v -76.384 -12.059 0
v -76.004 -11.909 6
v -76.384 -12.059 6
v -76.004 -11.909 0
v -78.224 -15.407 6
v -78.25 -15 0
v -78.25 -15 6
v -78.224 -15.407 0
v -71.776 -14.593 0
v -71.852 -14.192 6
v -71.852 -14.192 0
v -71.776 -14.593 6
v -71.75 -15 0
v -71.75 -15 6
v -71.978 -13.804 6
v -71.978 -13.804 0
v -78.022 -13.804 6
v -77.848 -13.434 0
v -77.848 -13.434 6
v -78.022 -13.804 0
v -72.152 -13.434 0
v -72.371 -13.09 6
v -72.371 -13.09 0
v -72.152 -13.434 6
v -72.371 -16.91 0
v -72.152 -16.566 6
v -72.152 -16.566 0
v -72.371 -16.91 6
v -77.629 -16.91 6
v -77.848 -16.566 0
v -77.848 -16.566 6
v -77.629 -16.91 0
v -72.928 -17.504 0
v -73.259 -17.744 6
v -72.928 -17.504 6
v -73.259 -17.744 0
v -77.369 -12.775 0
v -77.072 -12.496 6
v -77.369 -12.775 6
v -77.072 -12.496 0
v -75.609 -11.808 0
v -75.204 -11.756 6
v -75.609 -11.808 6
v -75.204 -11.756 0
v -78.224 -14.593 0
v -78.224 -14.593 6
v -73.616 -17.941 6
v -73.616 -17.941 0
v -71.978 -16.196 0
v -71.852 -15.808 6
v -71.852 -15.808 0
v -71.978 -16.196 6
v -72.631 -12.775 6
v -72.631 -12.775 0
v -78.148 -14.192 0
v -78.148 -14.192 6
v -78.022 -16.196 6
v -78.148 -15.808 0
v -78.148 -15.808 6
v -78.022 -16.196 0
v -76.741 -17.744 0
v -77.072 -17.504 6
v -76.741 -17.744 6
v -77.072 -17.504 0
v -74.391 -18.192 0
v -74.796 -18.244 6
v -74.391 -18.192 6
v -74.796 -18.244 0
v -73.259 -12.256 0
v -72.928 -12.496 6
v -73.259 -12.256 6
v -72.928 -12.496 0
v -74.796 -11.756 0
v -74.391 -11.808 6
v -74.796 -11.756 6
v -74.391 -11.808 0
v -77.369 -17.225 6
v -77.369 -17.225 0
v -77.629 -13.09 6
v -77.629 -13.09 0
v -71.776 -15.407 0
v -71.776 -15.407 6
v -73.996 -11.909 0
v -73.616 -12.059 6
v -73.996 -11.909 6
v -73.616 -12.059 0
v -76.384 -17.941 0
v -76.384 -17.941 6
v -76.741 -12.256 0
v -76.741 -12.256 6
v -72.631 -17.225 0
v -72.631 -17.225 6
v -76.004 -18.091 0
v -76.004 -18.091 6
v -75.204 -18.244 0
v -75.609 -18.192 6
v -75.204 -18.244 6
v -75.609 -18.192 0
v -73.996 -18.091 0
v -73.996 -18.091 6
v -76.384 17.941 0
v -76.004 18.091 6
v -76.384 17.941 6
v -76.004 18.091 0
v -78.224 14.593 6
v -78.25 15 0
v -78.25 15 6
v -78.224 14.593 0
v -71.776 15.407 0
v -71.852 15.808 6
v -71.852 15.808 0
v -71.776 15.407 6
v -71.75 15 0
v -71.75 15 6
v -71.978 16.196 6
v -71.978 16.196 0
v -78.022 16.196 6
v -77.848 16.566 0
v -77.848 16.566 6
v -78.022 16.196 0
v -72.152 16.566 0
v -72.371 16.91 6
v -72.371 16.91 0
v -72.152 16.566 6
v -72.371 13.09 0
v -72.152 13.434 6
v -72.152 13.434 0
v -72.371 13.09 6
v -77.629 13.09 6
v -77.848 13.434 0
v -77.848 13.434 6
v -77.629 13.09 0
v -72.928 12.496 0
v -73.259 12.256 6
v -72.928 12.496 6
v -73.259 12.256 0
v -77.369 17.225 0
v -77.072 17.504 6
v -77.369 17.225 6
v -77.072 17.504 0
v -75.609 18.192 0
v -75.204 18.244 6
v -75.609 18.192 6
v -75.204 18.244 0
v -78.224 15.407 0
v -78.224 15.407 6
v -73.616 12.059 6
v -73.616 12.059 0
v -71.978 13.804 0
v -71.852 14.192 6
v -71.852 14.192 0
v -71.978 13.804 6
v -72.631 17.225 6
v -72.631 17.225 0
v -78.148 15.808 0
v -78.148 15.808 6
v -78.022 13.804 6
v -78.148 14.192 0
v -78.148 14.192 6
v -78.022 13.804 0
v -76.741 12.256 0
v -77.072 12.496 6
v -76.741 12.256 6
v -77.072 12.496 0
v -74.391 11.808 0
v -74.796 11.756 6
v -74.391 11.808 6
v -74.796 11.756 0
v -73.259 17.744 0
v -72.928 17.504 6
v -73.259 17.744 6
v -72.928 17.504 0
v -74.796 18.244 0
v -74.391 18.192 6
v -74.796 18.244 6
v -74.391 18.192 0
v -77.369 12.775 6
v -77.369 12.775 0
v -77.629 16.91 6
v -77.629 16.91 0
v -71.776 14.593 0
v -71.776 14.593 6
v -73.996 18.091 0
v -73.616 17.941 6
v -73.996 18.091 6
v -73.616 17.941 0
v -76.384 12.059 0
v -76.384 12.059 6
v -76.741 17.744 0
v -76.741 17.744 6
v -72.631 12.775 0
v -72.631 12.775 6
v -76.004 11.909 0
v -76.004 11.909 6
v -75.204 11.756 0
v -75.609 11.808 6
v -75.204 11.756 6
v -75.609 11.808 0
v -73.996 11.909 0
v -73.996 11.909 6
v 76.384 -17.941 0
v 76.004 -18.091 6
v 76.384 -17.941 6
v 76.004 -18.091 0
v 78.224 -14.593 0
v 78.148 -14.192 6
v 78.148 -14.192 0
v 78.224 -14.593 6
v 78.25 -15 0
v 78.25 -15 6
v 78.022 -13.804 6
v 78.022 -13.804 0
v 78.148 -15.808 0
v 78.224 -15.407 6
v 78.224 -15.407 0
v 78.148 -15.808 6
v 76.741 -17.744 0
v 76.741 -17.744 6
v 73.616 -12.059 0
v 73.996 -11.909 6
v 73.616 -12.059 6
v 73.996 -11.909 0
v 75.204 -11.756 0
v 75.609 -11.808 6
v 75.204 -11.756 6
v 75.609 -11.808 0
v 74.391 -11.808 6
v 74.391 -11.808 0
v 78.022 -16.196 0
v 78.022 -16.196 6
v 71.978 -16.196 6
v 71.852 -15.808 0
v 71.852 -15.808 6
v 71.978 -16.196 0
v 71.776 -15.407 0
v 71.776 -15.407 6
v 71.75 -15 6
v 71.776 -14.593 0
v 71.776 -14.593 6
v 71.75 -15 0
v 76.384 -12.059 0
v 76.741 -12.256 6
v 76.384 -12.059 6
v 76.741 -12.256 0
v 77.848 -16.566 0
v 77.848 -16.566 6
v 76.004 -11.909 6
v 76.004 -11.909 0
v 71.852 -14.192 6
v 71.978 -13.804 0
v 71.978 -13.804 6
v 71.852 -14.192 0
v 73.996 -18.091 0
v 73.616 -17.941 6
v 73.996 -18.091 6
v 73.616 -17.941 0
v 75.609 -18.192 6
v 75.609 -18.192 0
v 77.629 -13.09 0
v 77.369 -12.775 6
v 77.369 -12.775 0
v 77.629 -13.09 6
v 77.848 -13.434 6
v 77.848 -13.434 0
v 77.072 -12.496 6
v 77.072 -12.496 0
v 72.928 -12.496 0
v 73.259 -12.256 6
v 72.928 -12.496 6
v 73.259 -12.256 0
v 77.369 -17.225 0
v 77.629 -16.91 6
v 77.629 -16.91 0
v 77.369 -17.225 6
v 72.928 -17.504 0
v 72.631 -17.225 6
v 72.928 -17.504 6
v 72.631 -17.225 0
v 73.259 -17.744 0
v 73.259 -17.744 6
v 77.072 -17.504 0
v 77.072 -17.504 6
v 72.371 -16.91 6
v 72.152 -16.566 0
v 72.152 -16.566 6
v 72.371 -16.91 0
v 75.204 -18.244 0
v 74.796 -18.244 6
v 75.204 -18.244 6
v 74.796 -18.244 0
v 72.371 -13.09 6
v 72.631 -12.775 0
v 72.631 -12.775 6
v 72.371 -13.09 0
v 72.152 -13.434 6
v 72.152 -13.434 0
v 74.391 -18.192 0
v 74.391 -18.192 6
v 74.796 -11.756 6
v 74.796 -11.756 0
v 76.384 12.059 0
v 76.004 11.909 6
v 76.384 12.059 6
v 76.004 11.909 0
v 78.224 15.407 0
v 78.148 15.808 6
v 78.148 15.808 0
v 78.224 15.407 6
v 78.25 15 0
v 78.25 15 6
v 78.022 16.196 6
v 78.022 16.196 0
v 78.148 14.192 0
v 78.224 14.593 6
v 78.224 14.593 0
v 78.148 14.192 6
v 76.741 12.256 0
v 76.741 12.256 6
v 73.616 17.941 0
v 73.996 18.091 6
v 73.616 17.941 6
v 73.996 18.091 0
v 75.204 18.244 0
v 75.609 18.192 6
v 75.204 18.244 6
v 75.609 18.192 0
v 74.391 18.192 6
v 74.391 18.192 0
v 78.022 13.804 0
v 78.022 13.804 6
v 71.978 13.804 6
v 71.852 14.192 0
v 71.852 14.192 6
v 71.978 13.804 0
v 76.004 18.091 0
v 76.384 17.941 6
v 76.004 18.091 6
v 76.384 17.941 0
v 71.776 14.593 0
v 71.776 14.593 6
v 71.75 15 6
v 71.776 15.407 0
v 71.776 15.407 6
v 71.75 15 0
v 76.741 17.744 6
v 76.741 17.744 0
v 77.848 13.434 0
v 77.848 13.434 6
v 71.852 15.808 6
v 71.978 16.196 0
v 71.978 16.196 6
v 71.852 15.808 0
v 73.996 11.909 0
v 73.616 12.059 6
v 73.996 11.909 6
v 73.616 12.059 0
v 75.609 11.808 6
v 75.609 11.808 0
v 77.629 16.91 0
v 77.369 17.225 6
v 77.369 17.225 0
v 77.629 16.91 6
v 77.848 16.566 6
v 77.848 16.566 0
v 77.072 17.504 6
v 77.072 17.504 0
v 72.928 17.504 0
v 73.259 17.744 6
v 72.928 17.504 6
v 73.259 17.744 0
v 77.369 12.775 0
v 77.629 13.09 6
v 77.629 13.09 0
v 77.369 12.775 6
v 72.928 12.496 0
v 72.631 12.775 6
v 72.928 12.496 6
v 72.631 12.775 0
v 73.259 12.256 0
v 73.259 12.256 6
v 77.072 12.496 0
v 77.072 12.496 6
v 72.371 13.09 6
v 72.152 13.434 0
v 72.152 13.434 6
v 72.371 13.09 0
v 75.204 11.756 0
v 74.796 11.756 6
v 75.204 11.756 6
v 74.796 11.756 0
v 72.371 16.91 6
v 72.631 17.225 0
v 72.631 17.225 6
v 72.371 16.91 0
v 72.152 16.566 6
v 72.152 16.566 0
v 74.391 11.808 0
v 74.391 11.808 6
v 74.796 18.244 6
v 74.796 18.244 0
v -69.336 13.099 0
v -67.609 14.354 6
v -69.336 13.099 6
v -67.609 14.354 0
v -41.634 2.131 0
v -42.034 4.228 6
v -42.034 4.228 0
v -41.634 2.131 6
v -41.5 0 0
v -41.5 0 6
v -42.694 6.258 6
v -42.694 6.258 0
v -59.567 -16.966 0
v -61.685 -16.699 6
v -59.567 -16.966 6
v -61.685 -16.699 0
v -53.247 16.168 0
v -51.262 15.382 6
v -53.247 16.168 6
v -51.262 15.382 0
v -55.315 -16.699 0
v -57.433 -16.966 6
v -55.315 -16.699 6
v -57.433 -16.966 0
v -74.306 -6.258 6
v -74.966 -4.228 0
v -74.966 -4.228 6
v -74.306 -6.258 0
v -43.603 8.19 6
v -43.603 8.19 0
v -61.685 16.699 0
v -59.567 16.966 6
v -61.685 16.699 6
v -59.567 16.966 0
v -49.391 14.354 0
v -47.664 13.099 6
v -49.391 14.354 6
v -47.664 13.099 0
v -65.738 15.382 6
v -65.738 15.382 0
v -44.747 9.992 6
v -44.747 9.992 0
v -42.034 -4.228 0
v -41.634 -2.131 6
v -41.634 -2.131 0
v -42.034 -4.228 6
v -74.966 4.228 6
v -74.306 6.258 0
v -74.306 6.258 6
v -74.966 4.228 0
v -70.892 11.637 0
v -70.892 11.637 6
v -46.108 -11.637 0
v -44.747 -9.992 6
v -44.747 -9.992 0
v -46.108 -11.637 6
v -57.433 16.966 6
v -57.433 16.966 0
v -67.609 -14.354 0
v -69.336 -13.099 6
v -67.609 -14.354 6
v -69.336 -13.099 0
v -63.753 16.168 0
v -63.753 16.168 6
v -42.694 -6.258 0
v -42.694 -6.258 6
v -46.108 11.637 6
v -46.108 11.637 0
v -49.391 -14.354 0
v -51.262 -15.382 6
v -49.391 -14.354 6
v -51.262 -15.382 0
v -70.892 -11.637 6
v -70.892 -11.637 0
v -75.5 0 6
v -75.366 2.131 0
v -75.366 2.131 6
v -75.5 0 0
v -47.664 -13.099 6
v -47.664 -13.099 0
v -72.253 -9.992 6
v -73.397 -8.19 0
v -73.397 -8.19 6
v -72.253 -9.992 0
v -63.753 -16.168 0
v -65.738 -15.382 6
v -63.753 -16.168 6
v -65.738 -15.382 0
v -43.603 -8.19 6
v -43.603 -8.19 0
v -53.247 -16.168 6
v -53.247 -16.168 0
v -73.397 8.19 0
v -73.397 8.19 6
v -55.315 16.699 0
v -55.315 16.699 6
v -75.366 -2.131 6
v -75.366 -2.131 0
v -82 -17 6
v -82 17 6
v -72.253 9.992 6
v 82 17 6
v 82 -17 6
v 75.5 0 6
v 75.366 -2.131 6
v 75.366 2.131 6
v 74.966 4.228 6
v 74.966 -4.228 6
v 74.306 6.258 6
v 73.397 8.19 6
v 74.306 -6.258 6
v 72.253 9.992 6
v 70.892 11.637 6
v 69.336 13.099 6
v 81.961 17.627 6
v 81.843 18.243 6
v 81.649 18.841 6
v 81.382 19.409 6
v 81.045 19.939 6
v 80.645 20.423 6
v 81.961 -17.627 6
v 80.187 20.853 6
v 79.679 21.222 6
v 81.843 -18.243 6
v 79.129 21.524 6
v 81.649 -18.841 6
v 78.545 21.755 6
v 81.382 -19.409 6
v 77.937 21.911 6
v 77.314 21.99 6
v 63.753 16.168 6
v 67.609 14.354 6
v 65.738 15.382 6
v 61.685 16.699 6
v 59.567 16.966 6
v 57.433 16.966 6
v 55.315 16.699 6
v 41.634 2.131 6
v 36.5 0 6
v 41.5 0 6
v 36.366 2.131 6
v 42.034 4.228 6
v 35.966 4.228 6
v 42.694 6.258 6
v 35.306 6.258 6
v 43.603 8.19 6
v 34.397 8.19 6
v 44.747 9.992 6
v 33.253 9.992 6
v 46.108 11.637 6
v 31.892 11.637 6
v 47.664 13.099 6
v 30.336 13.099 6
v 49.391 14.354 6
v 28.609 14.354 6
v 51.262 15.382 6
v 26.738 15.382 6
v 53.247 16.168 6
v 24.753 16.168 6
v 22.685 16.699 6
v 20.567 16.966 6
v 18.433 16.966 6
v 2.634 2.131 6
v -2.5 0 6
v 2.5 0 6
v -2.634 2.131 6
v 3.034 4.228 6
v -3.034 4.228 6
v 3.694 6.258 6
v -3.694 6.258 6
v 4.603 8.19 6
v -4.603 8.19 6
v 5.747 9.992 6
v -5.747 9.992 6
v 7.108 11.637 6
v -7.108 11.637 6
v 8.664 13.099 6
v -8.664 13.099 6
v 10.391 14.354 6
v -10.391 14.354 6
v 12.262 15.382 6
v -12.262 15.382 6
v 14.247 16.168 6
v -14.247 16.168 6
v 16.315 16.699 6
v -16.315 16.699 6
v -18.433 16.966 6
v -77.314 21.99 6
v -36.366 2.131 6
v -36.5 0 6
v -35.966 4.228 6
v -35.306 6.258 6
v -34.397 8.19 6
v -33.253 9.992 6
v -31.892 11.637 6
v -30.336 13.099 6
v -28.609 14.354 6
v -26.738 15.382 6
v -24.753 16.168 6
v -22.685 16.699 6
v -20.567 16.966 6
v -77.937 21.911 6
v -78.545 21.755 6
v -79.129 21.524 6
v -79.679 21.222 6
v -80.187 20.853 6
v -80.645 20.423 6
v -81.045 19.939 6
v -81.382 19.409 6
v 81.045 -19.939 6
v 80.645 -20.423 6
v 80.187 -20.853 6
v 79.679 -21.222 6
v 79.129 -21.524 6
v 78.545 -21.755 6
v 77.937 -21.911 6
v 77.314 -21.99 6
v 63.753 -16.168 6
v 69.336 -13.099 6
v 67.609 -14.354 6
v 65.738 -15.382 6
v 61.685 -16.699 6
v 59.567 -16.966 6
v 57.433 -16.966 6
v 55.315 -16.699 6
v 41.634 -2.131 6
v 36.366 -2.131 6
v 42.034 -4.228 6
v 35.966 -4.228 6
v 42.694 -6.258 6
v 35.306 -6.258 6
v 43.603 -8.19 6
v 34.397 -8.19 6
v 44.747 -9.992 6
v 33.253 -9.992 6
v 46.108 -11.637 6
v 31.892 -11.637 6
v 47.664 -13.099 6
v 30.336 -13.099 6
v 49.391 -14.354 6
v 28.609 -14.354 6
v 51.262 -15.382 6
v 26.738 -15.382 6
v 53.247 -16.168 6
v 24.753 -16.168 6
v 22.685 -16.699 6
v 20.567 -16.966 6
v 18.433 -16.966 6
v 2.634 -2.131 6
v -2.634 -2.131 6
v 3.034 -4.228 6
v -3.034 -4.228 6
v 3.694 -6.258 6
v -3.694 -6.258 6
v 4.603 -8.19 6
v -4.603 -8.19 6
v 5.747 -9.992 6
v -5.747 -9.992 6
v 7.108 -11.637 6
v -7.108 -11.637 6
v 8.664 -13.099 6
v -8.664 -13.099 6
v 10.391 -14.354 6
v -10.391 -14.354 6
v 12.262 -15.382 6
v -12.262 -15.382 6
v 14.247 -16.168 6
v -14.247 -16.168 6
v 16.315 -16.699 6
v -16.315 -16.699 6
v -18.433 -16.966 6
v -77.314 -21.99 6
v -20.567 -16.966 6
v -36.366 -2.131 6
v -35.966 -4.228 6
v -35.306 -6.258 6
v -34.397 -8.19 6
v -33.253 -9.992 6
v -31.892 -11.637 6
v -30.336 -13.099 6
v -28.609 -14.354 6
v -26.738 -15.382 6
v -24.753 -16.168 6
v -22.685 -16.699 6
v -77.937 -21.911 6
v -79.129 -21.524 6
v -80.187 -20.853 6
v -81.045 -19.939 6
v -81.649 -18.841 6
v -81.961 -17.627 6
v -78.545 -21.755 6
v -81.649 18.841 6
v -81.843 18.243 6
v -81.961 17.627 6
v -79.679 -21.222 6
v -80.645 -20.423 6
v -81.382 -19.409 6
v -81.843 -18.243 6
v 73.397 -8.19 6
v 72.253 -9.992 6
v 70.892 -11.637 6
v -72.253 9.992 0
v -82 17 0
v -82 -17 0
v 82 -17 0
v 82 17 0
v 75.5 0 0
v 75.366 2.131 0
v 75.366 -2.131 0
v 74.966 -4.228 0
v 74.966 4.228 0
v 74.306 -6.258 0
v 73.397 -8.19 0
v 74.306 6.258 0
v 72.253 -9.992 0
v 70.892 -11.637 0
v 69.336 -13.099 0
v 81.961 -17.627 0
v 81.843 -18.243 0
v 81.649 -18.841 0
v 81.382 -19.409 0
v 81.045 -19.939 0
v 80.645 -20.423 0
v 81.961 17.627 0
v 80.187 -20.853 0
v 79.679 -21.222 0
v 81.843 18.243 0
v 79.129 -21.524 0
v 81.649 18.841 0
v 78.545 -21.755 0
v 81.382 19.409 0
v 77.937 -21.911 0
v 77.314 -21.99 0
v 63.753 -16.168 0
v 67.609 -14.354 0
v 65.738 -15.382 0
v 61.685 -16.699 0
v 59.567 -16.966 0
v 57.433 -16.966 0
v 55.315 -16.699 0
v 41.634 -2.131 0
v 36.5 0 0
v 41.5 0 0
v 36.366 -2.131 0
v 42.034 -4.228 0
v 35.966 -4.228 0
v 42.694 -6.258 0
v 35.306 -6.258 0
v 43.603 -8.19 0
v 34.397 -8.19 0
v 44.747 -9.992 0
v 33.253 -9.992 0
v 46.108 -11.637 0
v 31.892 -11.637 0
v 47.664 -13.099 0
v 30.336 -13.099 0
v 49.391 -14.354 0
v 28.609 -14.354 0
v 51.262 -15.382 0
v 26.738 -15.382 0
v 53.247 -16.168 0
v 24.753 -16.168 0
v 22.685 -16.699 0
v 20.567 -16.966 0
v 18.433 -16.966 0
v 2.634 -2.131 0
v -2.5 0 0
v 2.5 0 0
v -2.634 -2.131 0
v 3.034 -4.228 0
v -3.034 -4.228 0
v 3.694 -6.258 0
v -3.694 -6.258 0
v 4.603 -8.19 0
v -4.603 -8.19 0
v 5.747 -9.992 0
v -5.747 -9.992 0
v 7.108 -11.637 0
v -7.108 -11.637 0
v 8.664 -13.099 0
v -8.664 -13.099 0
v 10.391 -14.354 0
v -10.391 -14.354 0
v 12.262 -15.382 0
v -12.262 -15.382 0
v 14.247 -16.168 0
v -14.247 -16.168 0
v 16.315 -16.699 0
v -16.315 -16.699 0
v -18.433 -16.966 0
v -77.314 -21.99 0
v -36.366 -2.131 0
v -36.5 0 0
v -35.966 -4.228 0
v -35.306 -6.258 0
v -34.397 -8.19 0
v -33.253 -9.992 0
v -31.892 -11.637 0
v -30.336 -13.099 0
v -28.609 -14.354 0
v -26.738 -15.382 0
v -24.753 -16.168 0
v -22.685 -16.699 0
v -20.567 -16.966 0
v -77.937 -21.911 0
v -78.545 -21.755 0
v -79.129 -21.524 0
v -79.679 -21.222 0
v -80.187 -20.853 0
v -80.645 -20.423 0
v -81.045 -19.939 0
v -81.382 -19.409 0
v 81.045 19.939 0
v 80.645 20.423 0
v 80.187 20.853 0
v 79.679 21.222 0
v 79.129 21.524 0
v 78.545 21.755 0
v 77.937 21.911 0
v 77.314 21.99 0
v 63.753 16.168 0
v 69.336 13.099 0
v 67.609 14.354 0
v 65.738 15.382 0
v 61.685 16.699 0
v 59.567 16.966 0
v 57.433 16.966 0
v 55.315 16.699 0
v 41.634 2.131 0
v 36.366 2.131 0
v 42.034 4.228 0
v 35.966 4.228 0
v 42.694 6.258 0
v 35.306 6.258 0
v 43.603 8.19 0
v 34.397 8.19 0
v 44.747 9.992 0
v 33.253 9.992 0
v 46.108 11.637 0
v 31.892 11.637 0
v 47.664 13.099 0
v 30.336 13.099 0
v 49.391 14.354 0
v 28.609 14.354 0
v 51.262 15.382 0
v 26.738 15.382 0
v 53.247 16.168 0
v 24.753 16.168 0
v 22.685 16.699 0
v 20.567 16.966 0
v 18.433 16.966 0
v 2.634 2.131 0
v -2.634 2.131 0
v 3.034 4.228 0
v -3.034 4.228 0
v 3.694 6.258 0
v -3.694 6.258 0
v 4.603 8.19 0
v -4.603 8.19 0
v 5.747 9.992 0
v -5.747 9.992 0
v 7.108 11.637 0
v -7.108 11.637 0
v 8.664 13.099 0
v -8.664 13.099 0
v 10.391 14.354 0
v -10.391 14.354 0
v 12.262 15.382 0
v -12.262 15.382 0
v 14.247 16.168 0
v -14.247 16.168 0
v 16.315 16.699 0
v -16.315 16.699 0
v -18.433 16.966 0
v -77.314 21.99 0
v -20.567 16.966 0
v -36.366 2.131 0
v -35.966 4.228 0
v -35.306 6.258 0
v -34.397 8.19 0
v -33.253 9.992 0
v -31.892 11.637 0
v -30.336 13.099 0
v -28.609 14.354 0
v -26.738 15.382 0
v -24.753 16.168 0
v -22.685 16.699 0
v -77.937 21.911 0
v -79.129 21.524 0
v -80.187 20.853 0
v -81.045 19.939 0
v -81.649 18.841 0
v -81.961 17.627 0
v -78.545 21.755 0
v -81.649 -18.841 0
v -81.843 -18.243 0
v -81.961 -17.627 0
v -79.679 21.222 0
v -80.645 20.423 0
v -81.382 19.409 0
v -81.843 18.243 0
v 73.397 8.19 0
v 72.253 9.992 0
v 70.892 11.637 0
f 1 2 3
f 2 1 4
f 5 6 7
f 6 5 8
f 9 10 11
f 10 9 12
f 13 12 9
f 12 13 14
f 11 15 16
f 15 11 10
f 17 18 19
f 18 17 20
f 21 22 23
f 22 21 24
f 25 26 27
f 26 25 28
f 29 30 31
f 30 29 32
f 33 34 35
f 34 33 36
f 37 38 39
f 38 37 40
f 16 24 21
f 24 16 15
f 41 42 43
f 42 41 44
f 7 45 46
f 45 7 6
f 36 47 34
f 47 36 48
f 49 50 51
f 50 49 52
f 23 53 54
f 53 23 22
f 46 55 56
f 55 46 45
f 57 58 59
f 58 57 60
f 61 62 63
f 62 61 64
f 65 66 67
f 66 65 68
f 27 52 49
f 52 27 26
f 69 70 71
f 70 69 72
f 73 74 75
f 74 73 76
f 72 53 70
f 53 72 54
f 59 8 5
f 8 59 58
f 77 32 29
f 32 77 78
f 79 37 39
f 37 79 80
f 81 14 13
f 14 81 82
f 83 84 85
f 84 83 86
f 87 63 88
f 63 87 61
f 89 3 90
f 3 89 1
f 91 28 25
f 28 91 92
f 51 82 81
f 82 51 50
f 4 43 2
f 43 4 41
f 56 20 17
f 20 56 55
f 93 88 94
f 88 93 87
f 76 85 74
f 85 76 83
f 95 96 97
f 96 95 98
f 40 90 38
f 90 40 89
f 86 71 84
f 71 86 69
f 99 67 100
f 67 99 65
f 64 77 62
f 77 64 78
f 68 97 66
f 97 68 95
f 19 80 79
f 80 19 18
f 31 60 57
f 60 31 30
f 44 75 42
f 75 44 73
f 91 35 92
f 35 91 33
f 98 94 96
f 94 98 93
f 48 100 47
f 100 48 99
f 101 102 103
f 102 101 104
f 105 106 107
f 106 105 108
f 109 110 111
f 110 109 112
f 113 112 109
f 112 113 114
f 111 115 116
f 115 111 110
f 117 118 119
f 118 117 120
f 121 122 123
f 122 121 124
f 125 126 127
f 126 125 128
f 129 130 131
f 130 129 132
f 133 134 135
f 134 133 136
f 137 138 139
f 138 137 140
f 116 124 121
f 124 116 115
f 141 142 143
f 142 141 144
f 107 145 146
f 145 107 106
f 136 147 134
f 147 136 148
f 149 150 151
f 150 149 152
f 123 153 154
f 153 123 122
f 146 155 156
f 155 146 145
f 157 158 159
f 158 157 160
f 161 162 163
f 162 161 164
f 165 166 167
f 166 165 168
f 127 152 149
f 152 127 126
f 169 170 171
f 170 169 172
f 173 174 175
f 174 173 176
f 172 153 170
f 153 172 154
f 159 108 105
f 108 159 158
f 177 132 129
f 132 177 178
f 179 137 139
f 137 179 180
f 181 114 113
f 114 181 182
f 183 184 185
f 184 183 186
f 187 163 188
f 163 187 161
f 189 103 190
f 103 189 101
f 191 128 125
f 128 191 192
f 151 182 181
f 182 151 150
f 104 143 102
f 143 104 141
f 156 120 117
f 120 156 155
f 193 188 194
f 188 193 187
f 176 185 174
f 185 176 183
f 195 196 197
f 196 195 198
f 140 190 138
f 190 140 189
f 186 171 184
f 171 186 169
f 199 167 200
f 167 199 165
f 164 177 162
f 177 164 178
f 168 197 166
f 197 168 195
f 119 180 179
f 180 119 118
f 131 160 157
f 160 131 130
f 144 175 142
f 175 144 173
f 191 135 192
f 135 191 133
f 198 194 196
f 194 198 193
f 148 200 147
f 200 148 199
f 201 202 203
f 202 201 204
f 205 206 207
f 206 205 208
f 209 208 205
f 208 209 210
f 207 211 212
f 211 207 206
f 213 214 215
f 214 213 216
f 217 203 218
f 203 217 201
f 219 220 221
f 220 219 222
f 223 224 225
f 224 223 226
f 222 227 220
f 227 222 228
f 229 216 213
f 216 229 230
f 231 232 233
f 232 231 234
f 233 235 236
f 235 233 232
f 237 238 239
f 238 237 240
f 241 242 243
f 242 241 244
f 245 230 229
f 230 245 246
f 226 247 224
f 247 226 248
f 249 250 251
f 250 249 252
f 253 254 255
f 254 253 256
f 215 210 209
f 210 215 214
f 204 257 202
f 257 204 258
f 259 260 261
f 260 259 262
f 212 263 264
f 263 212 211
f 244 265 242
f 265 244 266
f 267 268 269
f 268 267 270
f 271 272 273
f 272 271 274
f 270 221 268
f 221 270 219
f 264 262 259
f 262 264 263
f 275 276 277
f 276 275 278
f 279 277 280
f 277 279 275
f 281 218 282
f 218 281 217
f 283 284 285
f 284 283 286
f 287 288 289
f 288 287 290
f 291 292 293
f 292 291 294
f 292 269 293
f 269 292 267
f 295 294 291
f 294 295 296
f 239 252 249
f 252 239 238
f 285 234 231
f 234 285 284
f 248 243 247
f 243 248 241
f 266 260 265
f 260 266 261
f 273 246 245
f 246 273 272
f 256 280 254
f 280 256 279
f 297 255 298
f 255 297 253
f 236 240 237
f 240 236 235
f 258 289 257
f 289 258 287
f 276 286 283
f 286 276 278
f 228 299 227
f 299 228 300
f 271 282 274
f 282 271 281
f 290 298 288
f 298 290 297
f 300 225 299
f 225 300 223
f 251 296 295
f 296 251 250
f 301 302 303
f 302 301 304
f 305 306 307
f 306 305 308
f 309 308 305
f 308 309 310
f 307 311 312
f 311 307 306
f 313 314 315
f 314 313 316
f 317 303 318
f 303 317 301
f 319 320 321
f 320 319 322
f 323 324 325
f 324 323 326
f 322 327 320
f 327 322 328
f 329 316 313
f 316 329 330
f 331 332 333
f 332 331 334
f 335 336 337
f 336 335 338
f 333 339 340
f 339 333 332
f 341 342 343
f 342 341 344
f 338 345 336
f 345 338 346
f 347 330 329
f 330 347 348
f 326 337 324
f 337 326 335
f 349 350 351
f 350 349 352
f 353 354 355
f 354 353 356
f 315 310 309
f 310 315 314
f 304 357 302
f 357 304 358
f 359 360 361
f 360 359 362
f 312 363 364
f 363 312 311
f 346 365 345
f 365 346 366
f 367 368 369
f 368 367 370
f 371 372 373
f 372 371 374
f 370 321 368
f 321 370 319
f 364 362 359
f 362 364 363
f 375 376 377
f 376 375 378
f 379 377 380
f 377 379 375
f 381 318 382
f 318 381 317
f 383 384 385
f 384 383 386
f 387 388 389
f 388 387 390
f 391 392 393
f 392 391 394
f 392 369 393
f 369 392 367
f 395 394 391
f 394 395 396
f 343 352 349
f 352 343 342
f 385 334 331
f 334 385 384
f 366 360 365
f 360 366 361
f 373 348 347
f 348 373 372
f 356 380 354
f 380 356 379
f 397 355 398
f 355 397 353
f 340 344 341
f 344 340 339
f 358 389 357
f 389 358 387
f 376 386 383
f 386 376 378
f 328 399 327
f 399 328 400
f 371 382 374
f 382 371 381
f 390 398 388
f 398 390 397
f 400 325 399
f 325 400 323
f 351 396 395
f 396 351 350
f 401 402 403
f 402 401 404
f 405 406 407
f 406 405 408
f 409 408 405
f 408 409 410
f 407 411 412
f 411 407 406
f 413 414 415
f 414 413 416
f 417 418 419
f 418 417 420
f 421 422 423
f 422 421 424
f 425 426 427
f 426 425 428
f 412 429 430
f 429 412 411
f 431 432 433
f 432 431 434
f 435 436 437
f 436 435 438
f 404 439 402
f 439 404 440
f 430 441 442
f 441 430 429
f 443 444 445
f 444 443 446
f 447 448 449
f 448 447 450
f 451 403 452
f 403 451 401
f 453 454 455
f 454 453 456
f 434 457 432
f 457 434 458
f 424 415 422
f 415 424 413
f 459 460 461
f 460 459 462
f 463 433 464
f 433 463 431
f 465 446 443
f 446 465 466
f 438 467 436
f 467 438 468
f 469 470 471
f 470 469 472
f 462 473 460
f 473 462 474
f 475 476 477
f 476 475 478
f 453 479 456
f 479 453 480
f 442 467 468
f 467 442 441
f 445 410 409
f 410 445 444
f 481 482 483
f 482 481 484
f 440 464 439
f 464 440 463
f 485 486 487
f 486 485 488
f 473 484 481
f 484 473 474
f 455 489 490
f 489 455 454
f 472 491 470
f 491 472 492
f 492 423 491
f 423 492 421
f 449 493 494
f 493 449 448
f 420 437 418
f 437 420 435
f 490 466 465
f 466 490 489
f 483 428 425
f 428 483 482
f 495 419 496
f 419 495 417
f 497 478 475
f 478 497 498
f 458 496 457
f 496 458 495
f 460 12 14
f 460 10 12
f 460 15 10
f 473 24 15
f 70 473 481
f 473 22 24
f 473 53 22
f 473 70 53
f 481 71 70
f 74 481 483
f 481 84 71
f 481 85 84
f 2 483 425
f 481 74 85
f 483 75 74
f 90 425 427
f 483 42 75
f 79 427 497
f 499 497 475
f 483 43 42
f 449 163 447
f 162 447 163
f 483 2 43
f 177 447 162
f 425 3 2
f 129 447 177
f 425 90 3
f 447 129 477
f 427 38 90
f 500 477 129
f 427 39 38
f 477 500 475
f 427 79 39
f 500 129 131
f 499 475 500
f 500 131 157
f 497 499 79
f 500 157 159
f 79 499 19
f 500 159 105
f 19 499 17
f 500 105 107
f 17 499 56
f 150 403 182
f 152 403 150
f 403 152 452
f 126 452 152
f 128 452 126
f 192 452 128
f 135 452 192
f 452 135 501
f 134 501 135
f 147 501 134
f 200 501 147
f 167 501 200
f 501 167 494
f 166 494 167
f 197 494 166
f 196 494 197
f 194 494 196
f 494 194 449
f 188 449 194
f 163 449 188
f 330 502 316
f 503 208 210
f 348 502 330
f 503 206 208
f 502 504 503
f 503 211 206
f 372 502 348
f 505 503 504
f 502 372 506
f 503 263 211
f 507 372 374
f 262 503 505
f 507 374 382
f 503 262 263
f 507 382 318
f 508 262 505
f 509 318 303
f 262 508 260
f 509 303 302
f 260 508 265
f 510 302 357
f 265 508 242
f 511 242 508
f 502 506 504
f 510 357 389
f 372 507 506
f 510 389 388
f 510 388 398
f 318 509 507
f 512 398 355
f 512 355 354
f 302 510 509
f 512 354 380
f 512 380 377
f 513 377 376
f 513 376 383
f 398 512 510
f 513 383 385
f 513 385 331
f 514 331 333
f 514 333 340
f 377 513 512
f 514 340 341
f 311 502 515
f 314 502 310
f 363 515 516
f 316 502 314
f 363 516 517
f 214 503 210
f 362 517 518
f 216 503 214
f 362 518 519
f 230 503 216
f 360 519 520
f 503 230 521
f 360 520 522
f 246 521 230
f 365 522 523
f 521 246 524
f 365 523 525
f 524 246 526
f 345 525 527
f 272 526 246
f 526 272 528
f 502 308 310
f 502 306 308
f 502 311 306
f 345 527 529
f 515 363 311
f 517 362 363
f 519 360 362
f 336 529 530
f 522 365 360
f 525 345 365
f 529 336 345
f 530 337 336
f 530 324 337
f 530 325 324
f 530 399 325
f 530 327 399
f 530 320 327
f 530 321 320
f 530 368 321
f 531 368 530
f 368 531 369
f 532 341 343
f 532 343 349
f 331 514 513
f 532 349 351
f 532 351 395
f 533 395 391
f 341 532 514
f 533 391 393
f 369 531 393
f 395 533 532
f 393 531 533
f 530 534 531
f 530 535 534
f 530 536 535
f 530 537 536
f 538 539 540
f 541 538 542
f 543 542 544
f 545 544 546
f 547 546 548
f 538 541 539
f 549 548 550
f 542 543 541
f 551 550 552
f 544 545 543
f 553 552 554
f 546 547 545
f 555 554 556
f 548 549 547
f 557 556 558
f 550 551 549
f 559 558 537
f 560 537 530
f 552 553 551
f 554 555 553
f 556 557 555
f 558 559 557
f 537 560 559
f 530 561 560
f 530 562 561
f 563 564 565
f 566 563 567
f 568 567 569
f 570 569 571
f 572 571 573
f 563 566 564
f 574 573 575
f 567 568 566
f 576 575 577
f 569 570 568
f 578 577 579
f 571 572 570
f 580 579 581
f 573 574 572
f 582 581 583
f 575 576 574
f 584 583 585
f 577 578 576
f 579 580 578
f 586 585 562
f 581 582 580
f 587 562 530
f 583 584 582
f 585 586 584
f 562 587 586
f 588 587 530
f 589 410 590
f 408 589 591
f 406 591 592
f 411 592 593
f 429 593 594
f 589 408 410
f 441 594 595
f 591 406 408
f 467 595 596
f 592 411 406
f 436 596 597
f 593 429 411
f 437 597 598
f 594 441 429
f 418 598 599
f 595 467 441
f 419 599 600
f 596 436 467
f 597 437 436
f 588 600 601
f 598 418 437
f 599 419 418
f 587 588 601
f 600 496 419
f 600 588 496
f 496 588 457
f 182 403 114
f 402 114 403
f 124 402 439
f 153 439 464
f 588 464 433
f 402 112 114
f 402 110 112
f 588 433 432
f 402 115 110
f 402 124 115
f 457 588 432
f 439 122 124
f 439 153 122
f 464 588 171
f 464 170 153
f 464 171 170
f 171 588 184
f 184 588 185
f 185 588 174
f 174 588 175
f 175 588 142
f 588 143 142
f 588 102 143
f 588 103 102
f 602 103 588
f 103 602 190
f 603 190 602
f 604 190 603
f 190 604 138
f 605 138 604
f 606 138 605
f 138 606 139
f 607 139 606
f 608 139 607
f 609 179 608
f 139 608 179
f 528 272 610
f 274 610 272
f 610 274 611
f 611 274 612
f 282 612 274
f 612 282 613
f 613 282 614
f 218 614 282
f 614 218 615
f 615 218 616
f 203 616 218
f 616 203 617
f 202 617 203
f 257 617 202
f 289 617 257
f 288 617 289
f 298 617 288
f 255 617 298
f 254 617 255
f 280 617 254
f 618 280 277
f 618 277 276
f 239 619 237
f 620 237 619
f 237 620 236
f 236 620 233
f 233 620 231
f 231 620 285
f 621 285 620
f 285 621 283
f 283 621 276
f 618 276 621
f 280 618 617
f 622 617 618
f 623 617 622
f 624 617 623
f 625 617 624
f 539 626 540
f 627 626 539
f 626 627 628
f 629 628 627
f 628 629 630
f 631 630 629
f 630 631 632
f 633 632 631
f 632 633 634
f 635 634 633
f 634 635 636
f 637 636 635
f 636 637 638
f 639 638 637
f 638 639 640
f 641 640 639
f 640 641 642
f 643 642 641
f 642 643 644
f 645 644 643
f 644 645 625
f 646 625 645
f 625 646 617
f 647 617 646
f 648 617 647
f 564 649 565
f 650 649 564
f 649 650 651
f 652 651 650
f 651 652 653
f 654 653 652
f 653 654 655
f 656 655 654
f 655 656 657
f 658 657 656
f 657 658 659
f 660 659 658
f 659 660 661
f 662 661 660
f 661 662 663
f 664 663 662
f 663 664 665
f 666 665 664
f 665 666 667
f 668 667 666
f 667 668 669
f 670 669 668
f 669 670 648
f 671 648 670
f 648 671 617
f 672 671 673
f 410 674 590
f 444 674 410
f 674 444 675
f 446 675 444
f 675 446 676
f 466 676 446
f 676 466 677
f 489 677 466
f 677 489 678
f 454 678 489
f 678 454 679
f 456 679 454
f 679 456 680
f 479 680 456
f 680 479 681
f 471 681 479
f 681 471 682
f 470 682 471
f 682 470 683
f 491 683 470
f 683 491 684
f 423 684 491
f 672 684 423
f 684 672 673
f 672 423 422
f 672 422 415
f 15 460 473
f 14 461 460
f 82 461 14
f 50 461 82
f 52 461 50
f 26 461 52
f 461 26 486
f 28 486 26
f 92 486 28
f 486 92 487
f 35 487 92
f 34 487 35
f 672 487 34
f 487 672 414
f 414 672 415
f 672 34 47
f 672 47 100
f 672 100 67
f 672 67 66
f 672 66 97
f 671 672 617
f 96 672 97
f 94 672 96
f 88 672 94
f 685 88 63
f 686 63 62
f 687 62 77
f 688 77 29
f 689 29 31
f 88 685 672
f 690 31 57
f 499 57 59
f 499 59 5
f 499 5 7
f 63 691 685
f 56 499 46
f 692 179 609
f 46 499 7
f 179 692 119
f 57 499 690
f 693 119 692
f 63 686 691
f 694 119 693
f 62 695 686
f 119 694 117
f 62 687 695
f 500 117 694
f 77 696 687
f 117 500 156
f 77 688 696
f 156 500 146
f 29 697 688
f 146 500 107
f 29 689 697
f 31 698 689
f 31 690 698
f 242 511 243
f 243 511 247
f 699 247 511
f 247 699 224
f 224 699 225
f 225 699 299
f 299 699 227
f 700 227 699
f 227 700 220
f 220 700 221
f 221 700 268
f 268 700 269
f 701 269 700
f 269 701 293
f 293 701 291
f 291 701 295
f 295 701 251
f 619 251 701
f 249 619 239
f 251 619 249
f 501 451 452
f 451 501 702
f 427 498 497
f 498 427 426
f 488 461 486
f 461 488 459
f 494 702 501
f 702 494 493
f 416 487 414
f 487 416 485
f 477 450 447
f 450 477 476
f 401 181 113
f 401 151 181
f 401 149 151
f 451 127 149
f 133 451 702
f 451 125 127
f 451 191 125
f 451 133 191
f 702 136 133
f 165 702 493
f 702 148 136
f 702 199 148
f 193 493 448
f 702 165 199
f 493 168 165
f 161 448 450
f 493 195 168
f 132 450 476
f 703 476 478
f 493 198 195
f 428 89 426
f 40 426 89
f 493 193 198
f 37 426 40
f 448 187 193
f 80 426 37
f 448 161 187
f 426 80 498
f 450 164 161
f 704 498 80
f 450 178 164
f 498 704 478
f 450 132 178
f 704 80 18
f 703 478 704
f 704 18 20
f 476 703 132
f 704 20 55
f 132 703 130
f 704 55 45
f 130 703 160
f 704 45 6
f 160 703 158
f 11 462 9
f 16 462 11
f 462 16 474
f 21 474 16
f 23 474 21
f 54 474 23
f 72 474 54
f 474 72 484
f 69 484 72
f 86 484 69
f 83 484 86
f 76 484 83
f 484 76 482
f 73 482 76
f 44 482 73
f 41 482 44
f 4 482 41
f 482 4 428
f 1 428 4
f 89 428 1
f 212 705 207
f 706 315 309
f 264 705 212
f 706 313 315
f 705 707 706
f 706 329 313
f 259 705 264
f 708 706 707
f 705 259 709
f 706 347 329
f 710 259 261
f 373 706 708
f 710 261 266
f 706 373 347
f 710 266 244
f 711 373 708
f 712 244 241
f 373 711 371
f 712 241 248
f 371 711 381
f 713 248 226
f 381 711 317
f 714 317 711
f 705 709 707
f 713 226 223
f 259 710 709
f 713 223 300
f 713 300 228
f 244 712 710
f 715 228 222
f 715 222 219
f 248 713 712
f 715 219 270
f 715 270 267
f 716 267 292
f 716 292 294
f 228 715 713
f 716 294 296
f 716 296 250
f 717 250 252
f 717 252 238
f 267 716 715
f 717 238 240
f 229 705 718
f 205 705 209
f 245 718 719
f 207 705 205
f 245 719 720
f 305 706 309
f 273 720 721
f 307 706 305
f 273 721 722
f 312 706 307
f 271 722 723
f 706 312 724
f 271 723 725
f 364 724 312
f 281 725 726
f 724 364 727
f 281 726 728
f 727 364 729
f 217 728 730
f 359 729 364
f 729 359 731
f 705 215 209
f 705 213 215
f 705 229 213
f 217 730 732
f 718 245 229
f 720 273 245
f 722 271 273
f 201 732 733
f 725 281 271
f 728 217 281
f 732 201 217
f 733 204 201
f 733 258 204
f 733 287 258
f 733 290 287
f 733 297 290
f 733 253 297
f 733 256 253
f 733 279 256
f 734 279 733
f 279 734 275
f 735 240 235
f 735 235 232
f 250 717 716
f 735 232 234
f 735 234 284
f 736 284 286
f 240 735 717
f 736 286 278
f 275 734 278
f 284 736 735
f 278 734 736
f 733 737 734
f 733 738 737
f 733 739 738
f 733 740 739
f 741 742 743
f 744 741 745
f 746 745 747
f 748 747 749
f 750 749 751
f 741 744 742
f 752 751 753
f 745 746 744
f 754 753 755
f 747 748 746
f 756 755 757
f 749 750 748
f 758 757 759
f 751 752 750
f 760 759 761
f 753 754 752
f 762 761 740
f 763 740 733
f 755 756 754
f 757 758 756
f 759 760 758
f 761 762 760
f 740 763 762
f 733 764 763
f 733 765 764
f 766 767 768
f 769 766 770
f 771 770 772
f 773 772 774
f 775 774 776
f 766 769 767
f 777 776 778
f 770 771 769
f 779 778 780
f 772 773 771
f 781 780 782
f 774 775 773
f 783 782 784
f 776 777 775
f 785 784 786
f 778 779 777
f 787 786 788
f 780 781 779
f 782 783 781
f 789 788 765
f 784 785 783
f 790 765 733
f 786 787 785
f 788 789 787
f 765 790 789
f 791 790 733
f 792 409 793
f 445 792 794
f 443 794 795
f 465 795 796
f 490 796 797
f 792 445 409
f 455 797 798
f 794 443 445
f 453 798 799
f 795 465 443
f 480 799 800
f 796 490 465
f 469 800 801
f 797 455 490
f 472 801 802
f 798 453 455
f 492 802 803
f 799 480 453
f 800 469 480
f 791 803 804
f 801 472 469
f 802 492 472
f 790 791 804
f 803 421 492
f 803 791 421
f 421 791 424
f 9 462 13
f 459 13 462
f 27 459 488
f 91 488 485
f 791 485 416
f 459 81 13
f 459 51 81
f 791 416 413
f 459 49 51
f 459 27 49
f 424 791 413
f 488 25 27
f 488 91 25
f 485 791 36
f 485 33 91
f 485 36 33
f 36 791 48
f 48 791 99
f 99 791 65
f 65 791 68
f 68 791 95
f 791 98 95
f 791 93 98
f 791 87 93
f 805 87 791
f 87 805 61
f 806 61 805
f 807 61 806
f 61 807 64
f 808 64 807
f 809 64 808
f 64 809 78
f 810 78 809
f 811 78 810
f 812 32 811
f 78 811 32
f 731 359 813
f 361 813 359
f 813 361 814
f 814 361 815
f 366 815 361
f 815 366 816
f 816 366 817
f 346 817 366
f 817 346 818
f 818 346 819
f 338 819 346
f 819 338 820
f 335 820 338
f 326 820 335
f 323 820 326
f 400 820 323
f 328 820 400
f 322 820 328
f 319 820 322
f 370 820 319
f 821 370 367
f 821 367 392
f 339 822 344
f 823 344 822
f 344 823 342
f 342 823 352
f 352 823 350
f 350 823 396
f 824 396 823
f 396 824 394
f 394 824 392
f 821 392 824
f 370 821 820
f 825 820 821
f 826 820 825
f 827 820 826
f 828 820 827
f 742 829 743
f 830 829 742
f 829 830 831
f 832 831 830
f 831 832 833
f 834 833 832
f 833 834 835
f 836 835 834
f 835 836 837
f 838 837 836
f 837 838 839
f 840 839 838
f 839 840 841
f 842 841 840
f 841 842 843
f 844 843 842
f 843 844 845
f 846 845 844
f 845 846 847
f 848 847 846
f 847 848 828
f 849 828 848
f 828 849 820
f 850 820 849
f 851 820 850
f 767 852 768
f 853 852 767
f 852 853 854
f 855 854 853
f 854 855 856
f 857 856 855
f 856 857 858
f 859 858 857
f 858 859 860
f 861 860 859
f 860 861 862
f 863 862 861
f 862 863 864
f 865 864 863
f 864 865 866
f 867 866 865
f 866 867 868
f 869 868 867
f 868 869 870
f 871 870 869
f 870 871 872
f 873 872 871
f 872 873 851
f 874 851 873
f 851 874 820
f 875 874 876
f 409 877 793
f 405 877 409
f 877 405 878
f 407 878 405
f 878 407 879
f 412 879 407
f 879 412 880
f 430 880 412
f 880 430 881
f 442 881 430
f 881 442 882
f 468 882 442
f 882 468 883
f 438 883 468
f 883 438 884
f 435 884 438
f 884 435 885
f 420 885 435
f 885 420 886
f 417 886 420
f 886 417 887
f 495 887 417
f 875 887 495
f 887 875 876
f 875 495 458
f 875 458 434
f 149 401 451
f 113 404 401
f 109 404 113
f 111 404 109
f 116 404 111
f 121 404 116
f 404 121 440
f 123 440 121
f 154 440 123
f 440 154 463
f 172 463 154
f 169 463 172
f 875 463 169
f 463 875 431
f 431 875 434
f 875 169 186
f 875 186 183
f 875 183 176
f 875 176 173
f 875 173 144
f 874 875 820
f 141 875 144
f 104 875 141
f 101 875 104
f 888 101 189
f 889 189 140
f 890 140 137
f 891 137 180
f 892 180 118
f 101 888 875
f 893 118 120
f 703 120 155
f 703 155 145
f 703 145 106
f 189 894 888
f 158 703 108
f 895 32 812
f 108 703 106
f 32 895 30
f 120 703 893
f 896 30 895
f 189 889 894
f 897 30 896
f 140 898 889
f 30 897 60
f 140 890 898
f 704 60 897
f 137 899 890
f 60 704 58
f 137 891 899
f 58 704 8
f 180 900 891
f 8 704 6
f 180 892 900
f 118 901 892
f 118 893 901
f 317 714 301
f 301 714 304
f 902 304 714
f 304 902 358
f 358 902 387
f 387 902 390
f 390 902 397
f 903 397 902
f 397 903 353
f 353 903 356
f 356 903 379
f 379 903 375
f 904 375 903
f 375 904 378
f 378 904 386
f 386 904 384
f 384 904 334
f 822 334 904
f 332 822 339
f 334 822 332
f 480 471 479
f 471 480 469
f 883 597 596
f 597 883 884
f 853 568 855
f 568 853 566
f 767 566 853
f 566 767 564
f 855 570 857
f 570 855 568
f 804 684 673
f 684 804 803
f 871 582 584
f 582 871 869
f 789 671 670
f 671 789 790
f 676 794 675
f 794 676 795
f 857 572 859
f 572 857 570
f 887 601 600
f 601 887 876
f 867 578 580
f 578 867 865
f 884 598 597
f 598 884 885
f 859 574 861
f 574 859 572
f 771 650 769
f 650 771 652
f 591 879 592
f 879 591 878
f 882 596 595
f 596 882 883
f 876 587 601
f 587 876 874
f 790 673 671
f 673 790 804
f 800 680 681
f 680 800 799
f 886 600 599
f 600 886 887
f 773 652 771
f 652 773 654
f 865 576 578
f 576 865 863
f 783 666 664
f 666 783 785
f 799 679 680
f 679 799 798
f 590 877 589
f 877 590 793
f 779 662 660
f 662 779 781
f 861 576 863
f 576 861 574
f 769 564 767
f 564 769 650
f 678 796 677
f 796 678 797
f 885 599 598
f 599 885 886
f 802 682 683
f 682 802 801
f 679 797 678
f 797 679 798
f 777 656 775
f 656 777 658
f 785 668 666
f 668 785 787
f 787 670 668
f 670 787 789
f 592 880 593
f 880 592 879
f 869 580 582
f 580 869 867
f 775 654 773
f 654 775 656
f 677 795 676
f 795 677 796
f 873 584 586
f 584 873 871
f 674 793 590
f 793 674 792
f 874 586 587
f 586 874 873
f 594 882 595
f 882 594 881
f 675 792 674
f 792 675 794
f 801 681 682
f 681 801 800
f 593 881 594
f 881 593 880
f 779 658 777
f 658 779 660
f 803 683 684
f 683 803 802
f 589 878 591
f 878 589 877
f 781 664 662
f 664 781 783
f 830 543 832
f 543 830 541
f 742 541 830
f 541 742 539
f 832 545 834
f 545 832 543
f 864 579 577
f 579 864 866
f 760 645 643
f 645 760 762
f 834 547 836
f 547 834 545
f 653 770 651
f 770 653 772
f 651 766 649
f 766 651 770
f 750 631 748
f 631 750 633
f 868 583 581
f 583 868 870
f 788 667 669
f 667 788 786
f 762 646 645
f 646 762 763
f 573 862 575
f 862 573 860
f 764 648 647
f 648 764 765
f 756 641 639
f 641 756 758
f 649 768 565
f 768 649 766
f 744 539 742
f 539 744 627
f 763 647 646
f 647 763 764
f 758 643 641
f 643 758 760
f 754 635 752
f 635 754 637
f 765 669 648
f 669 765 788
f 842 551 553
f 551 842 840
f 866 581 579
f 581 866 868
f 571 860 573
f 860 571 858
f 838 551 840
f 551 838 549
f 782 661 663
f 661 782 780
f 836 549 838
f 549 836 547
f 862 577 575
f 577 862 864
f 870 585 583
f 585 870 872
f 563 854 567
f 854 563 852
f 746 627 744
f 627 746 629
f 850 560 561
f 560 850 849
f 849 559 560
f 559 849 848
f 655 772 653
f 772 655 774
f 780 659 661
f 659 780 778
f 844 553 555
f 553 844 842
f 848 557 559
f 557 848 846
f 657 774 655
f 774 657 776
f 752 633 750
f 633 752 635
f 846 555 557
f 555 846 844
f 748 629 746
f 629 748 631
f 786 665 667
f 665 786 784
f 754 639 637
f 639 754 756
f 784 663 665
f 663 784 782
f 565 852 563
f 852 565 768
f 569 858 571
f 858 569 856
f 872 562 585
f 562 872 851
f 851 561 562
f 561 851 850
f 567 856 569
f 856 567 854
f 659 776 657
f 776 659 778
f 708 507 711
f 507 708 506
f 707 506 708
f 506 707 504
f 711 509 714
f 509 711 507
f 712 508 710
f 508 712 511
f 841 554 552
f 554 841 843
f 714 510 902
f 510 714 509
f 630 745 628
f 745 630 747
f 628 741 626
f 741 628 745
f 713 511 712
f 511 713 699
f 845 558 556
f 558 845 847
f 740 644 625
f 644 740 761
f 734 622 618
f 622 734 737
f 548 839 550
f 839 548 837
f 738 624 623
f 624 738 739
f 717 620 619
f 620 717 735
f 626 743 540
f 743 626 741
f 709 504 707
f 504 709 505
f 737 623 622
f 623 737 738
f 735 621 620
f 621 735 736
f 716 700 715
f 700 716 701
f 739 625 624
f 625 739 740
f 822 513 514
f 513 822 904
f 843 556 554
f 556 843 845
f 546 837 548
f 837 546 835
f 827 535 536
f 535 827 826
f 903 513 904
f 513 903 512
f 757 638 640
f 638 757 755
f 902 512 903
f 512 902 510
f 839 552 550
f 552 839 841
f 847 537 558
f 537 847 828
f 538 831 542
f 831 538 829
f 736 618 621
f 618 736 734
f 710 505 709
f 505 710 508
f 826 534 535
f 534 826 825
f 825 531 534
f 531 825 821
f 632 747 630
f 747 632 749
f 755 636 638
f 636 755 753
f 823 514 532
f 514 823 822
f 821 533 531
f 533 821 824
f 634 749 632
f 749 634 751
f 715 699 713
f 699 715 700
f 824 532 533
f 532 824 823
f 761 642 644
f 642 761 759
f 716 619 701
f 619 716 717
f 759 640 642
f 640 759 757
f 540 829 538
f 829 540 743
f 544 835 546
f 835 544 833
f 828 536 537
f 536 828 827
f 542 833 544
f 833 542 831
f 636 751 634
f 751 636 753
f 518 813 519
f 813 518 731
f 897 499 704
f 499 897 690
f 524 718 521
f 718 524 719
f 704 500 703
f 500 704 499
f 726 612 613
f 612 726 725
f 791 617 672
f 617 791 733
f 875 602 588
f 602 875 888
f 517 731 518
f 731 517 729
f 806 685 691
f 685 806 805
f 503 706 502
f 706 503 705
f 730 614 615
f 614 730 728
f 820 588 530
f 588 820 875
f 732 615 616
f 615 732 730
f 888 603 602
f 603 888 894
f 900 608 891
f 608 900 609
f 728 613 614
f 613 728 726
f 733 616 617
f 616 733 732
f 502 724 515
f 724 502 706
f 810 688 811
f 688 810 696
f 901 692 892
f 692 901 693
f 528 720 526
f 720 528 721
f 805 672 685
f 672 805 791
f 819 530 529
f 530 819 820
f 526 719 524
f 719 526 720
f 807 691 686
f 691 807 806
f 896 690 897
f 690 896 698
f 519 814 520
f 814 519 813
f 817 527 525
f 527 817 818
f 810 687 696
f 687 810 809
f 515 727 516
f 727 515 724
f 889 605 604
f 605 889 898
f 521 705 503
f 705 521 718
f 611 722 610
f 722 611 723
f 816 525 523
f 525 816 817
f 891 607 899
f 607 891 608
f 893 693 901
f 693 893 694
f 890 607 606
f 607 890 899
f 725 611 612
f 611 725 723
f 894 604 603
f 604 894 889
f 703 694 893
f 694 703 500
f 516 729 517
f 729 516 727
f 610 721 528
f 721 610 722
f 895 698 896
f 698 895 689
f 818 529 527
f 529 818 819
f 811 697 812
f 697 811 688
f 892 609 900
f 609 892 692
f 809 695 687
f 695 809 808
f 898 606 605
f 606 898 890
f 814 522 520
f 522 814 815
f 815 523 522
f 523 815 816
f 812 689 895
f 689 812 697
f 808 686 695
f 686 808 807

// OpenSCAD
$fn = 50;


difference() {
	union() {
		hull() {
			translate(v = [-77.0000000000, 17.0000000000, 0]) {
				cylinder(h = 6, r = 5);
			}
			translate(v = [77.0000000000, 17.0000000000, 0]) {
				cylinder(h = 6, r = 5);
			}
			translate(v = [-77.0000000000, -17.0000000000, 0]) {
				cylinder(h = 6, r = 5);
			}
			translate(v = [77.0000000000, -17.0000000000, 0]) {
				cylinder(h = 6, r = 5);
			}
		}
	}
	union() {
		#translate(v = [-75.0000000000, -15.0000000000, -100.0000000000]) {
			cylinder(h = 200, r = 3.2500000000);
		}
		#translate(v = [-75.0000000000, 15.0000000000, -100.0000000000]) {
			cylinder(h = 200, r = 3.2500000000);
		}
		#translate(v = [75.0000000000, -15.0000000000, -100.0000000000]) {
			cylinder(h = 200, r = 3.2500000000);
		}
		#translate(v = [75.0000000000, 15.0000000000, -100.0000000000]) {
			cylinder(h = 200, r = 3.2500000000);
		}
		#translate(v = [-58.5000000000, 0, 0]) {
			cylinder(h = 6, r = 17.0000000000);
		}
		#translate(v = [-19.5000000000, 0, 0]) {
			cylinder(h = 6, r = 17.0000000000);
		}
		#translate(v = [19.5000000000, 0, 0]) {
			cylinder(h = 6, r = 17.0000000000);
		}
		#translate(v = [58.5000000000, 0, 0]) {
			cylinder(h = 6, r = 17.0000000000);
		}
	}
}
